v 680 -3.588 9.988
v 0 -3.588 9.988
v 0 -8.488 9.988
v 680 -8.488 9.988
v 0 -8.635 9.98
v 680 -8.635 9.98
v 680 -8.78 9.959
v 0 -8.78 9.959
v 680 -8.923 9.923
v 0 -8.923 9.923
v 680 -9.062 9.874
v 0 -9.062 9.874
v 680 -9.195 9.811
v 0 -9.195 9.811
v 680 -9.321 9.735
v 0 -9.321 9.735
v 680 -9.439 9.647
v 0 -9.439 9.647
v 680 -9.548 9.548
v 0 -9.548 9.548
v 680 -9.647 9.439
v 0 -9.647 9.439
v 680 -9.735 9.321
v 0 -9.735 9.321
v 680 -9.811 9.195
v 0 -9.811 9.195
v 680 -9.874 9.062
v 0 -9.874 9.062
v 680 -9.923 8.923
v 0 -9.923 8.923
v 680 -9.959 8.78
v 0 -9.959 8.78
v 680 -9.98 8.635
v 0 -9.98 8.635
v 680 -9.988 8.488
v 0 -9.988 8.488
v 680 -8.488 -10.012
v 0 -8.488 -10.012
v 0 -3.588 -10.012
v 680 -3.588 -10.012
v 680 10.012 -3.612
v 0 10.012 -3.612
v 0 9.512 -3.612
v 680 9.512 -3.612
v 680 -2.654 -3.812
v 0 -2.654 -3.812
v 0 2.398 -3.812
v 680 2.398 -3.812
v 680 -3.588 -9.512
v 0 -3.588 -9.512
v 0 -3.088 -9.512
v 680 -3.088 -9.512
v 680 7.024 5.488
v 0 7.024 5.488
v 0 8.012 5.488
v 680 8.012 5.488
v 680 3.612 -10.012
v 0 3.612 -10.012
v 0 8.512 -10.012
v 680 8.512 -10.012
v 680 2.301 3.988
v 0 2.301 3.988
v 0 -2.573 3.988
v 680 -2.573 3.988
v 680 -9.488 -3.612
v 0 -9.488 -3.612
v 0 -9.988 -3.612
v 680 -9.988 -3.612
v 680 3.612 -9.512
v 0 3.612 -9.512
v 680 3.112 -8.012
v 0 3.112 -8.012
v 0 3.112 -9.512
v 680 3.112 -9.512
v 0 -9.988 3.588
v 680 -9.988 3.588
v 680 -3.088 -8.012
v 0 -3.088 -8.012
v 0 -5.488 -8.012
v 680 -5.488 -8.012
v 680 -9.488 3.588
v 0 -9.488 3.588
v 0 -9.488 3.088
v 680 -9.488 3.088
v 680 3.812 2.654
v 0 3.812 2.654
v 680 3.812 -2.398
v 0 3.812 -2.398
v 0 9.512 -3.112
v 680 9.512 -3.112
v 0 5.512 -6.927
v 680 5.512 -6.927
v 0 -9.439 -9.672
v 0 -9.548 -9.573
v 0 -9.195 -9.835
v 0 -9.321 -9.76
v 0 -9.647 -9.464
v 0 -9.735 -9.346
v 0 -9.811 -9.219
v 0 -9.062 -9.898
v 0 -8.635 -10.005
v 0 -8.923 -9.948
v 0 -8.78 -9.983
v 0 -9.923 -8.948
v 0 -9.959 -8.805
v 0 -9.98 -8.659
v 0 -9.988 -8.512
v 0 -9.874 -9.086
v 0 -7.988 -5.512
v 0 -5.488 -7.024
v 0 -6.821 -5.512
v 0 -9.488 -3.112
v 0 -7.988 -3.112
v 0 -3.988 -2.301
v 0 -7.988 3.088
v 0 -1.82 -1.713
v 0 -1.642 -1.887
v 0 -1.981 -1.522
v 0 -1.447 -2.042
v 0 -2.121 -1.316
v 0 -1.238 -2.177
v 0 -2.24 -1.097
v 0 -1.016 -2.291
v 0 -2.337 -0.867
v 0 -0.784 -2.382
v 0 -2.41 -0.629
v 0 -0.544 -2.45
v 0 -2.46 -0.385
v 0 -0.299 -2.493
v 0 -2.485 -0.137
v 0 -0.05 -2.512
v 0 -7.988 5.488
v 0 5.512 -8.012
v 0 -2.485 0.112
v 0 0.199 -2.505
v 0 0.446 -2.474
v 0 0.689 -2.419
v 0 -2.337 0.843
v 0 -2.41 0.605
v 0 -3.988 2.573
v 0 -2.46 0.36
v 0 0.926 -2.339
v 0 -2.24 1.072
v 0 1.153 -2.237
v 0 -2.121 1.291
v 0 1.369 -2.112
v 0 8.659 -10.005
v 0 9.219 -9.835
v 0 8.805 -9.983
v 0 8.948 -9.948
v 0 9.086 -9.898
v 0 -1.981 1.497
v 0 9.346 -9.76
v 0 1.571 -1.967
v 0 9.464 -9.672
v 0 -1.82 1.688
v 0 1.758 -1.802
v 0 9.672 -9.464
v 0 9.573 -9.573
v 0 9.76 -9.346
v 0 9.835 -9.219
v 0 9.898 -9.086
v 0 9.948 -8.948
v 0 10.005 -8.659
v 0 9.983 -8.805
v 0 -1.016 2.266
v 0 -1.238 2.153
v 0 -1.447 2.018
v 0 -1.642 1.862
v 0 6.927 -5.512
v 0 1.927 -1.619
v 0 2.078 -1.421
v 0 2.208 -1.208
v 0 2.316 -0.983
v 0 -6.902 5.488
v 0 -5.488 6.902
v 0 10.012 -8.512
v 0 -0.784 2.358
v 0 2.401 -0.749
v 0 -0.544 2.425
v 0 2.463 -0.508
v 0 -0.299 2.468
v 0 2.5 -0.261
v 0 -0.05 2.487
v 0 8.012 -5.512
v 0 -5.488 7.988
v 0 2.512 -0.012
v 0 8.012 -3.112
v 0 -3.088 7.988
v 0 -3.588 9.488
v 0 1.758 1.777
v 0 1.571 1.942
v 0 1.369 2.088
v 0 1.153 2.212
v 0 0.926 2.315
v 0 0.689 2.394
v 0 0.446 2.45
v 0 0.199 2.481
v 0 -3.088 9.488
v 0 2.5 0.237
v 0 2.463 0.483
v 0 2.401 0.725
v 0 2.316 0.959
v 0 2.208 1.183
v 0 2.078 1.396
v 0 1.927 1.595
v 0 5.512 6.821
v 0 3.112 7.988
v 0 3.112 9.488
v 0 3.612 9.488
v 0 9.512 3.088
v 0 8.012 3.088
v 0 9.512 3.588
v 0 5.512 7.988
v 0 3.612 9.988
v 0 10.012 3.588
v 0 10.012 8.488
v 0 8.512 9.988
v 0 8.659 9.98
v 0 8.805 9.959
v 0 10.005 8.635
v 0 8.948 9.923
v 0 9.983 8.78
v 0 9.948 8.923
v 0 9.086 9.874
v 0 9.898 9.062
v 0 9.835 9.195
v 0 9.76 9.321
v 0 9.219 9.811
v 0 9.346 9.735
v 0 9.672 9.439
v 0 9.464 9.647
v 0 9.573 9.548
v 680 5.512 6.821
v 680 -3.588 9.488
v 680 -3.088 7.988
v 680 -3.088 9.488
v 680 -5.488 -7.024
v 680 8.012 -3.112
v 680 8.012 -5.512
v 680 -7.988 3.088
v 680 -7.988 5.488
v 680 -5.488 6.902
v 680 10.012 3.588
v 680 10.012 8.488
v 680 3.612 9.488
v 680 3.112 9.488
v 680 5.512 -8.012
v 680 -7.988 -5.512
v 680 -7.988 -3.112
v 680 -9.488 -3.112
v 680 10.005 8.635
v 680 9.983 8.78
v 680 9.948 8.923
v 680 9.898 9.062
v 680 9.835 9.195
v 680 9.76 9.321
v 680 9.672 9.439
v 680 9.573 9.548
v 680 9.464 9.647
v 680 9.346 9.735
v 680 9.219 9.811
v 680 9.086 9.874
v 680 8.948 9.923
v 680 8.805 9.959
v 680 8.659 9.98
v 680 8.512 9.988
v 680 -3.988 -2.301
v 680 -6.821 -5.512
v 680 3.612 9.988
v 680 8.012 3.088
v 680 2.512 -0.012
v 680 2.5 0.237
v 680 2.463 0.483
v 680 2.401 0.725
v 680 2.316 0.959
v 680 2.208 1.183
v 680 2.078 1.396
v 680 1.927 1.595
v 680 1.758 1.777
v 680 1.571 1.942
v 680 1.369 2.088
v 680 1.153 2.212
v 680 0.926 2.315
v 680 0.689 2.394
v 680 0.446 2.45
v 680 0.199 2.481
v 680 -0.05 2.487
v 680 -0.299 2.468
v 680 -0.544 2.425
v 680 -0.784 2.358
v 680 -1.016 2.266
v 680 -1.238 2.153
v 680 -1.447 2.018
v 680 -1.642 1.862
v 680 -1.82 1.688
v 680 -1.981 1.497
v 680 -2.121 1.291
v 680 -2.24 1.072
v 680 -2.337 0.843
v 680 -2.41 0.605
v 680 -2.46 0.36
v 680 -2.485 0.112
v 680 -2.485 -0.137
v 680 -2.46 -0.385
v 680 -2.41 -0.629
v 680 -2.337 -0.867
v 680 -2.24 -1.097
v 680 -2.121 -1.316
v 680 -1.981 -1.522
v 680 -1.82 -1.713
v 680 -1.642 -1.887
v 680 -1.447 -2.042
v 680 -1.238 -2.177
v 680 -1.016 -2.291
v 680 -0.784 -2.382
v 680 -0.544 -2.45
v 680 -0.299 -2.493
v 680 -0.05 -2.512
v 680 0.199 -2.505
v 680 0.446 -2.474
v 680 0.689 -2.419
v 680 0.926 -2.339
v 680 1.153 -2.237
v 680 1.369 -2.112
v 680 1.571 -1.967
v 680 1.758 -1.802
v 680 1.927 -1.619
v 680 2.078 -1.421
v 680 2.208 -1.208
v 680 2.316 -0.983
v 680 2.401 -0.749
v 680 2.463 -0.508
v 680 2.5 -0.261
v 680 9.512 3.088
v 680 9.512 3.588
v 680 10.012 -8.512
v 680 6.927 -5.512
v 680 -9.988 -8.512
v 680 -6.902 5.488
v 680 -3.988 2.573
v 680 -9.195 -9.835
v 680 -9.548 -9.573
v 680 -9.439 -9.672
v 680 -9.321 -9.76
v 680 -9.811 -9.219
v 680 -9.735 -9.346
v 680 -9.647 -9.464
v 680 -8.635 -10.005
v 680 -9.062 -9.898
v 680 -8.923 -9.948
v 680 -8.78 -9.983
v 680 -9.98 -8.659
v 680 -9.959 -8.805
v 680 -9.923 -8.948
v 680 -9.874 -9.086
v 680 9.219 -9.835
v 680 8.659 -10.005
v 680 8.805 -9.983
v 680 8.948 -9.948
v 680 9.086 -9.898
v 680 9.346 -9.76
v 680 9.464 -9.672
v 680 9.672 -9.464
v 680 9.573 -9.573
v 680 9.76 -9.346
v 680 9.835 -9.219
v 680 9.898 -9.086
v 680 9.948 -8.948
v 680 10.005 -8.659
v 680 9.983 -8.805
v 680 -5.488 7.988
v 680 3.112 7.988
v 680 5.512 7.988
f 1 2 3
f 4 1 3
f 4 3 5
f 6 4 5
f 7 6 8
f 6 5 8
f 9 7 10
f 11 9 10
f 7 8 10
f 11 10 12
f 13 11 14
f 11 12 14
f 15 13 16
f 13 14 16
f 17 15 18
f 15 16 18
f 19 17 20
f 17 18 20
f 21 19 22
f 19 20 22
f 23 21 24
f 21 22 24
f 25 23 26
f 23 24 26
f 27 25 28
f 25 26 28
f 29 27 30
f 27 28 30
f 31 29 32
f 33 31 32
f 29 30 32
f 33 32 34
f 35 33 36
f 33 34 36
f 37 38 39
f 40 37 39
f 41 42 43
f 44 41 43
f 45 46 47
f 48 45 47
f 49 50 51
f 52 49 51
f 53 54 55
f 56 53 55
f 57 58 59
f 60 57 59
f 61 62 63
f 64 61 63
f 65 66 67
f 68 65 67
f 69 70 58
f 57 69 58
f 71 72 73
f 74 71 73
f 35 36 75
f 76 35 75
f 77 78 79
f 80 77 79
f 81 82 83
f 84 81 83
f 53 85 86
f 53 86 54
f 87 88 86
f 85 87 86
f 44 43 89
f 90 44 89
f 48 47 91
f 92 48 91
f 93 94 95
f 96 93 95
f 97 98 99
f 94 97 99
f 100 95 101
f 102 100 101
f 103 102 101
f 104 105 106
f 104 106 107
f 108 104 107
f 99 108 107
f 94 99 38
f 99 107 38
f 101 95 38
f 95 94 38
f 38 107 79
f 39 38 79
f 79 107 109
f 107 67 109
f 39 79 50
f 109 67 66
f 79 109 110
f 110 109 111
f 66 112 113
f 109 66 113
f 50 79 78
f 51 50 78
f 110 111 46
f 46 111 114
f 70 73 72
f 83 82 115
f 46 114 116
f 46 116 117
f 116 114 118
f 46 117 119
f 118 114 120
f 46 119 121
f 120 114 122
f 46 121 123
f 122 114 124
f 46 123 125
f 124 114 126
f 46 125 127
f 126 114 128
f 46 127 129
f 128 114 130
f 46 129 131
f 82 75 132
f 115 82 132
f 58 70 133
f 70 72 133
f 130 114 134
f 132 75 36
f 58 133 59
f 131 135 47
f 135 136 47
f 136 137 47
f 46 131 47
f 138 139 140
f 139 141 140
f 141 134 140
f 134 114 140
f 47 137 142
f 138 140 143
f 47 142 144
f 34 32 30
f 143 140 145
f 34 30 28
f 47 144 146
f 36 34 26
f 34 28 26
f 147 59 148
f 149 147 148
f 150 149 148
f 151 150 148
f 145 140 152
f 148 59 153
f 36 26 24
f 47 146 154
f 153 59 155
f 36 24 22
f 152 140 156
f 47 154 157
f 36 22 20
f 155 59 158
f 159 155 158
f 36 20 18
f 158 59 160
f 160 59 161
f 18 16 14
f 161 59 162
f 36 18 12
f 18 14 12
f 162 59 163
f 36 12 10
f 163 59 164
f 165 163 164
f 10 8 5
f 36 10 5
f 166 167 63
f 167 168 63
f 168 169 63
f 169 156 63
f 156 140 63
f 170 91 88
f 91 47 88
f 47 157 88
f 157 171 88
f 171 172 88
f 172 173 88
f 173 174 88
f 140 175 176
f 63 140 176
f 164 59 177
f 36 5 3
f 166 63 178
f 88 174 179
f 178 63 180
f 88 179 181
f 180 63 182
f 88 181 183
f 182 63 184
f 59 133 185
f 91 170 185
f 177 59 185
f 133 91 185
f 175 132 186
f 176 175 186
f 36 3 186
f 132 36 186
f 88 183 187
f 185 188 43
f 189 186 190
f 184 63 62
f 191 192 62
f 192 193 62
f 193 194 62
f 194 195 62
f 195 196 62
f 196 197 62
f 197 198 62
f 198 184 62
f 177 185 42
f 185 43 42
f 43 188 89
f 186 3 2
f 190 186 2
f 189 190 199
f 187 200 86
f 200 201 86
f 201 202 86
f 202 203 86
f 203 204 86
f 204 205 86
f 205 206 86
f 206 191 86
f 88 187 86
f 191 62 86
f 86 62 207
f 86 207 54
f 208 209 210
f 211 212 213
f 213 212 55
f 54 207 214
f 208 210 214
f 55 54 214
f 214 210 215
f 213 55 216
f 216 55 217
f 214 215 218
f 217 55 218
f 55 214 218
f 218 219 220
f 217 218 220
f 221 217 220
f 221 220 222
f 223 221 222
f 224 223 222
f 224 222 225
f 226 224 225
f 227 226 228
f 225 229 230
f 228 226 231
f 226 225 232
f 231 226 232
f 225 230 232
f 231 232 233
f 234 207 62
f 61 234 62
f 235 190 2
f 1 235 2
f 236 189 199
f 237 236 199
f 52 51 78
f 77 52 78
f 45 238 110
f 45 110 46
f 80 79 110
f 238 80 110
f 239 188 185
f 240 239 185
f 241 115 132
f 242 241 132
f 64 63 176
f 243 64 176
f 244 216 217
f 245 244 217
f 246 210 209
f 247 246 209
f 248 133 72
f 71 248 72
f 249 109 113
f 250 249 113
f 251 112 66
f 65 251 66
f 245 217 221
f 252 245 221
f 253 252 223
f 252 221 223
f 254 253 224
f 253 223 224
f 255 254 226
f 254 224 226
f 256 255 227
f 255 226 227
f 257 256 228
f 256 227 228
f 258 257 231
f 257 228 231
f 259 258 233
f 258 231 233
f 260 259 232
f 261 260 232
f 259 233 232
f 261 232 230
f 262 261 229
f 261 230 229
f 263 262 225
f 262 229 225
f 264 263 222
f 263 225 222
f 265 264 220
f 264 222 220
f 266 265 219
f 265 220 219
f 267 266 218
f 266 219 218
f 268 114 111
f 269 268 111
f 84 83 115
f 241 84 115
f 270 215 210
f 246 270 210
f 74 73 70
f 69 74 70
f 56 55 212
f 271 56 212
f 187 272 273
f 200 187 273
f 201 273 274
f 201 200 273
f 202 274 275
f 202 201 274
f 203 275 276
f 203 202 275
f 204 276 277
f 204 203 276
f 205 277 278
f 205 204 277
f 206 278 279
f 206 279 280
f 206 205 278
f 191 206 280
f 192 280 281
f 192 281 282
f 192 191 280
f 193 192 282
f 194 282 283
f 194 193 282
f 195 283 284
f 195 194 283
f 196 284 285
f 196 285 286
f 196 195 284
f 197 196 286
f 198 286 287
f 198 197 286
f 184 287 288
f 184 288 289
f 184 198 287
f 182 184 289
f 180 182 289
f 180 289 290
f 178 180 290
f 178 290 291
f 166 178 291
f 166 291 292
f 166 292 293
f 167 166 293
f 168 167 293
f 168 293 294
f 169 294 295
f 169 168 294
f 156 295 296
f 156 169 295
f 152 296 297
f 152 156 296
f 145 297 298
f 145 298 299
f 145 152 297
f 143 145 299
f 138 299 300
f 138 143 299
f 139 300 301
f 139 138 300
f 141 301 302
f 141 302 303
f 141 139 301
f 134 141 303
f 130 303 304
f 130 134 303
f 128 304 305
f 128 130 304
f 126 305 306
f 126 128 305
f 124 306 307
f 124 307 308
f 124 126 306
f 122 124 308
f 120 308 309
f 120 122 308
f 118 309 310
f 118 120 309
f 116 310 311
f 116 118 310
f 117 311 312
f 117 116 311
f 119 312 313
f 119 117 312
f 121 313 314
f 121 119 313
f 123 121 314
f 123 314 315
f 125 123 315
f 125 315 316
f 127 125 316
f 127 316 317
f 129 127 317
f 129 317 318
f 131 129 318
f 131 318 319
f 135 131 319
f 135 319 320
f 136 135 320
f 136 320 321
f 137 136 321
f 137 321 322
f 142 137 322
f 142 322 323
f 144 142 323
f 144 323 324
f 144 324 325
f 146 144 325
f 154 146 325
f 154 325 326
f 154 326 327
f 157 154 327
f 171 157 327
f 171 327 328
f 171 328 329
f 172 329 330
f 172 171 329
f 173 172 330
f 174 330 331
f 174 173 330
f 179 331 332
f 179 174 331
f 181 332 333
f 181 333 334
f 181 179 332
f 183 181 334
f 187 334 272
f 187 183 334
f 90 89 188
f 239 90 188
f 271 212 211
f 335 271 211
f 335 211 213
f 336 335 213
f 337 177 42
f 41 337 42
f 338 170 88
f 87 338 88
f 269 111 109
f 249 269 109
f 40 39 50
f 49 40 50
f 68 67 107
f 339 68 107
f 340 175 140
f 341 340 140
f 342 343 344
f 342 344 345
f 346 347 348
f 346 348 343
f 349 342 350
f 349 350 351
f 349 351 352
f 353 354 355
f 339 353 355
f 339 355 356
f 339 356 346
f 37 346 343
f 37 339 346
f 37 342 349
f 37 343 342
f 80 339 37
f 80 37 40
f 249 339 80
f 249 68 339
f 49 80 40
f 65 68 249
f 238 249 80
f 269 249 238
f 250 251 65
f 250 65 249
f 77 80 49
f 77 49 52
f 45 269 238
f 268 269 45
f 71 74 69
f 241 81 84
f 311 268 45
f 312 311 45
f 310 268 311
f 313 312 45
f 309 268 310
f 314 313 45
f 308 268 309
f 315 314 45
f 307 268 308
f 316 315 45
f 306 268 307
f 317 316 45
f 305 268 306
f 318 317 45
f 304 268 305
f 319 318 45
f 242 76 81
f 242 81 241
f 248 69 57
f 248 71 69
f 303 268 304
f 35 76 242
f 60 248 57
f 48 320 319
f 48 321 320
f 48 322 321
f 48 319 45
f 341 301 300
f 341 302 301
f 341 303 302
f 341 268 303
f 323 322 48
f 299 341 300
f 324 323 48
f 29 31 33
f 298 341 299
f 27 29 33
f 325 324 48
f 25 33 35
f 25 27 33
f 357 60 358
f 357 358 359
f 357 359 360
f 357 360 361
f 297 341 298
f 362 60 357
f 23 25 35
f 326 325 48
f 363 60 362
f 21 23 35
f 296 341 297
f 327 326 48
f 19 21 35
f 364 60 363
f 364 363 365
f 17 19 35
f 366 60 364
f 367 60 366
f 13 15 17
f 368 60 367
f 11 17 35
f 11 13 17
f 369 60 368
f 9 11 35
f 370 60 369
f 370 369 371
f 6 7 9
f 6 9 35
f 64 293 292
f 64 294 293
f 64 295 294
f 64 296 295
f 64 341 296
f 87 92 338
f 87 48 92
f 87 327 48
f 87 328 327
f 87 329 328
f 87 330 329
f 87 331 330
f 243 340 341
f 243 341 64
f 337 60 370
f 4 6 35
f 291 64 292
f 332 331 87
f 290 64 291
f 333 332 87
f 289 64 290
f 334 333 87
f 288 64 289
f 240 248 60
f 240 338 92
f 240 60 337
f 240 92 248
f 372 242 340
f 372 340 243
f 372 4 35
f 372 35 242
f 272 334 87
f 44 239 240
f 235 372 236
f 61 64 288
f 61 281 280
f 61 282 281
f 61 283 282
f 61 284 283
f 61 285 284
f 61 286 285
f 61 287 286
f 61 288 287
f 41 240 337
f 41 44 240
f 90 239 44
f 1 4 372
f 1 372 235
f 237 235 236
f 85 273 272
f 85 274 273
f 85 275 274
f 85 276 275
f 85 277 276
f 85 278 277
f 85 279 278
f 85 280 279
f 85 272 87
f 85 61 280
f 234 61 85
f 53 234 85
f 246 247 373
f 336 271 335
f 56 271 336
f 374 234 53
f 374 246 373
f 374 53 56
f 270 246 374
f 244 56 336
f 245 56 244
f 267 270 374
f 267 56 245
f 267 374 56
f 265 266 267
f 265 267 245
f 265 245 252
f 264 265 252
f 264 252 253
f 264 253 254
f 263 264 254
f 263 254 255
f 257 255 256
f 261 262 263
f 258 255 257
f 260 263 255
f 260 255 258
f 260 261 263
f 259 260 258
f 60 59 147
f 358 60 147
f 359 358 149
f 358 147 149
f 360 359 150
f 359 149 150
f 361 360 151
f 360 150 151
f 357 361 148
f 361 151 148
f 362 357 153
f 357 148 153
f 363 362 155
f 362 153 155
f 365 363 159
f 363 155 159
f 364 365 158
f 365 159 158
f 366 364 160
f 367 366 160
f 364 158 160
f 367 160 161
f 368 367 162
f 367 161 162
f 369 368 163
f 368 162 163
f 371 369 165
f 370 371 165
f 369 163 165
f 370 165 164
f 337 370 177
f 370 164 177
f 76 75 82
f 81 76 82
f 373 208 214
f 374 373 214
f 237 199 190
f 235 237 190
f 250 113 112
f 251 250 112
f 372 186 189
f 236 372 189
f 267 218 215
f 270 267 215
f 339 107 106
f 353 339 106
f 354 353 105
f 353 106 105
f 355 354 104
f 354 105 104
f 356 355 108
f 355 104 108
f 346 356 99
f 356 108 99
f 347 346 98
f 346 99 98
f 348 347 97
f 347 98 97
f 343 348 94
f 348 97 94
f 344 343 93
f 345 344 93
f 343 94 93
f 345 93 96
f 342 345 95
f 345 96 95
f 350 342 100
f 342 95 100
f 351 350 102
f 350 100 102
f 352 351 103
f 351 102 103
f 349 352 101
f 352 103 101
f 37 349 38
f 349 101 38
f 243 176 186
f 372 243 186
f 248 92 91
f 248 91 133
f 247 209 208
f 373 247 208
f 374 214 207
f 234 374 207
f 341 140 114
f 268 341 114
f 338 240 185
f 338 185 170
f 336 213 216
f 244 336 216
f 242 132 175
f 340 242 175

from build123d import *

# Parameters (mm, degrees)
F0_R     = 2.5
F1_DEPTH = 680


with BuildPart() as f1:
    # F0 (on Right) → F1 (new body)
    with BuildSketch(Plane.YZ):
        with BuildLine():
            Line((-3.587692, 9.987692), (-8.487692, 9.987692))
            ThreePointArc((-8.487692, 9.987692), (-9.548352, 9.548352), (-9.987692, 8.487692))
            Line((-9.987692, 8.487692), (-9.987692, 3.587692))
            Line((-9.987692, 3.587692), (-9.487692, 3.587692))
            Line((-9.487692, 3.587692), (-9.487692, 3.087692))
            Line((-9.487692, 3.087692), (-7.987692, 3.087692))
            Line((-7.987692, 3.087692), (-7.987692, 5.487692))
            Line((-7.987692, 5.487692), (-6.901906, 5.487692))
            Line((-6.901906, 5.487692), (-3.987692, 2.573479))
            Line((-3.987692, 2.573479), (-3.987692, -2.30087))
            Line((-3.987692, -2.30087), (-6.821314, -5.512308))
            Line((-6.821314, -5.512308), (-7.987692, -5.512308))
            Line((-7.987692, -5.512308), (-7.987692, -3.112308))
            Line((-7.987692, -3.112308), (-9.487692, -3.112308))
            Line((-9.487692, -3.112308), (-9.487692, -3.612308))
            Line((-9.487692, -3.612308), (-9.987692, -3.612308))
            Line((-9.987692, -3.612308), (-9.987692, -8.512308))
            ThreePointArc((-9.987692, -8.512308), (-9.548352, -9.572968), (-8.487692, -10.012308))
            Line((-8.487692, -10.012308), (-3.587692, -10.012308))
            Line((-3.587692, -10.012308), (-3.587692, -9.512308))
            Line((-3.587692, -9.512308), (-3.087692, -9.512308))
            Line((-3.087692, -9.512308), (-3.087692, -8.012308))
            Line((-3.087692, -8.012308), (-5.487692, -8.012308))
            Line((-5.487692, -8.012308), (-5.487692, -7.023746))
            Line((-5.487692, -7.023746), (-2.654071, -3.812308))
            Line((-2.654071, -3.812308), (2.398094, -3.812308))
            Line((2.398094, -3.812308), (5.512308, -6.926521))
            Line((5.512308, -6.926521), (5.512308, -8.012308))
            Line((5.512308, -8.012308), (3.112308, -8.012308))
            Line((3.112308, -8.012308), (3.112308, -9.512308))
            Line((3.112308, -9.512308), (3.612308, -9.512308))
            Line((3.612308, -9.512308), (3.612308, -10.012308))
            Line((3.612308, -10.012308), (8.512308, -10.012308))
            ThreePointArc((8.512308, -10.012308), (9.572968, -9.572968), (10.012308, -8.512308))
            Line((10.012308, -8.512308), (10.012308, -3.612308))
            Line((10.012308, -3.612308), (9.512308, -3.612308))
            Line((9.512308, -3.612308), (9.512308, -3.112308))
            Line((9.512308, -3.112308), (8.012308, -3.112308))
            Line((8.012308, -3.112308), (8.012308, -5.512308))
            Line((8.012308, -5.512308), (6.926521, -5.512308))
            Line((6.926521, -5.512308), (3.812308, -2.398094))
            Line((3.812308, -2.398094), (3.812308, 2.654071))
            Line((3.812308, 2.654071), (7.023746, 5.487692))
            Line((7.023746, 5.487692), (8.012308, 5.487692))
            Line((8.012308, 5.487692), (8.012308, 3.087692))
            Line((8.012308, 3.087692), (9.512308, 3.087692))
            Line((9.512308, 3.087692), (9.512308, 3.587692))
            Line((9.512308, 3.587692), (10.012308, 3.587692))
            Line((10.012308, 3.587692), (10.012308, 8.487692))
            ThreePointArc((10.012308, 8.487692), (9.572968, 9.548352), (8.512308, 9.987692))
            Line((8.512308, 9.987692), (3.612308, 9.987692))
            Line((3.612308, 9.987692), (3.612308, 9.487692))
            Line((3.612308, 9.487692), (3.112308, 9.487692))
            Line((3.112308, 9.487692), (3.112308, 7.987692))
            Line((3.112308, 7.987692), (5.512308, 7.987692))
            Line((5.512308, 7.987692), (5.512308, 6.821314))
            Line((5.512308, 6.821314), (2.30087, 3.987692))
            Line((2.30087, 3.987692), (-2.573479, 3.987692))
            Line((-2.573479, 3.987692), (-5.487692, 6.901906))
            Line((-5.487692, 6.901906), (-5.487692, 7.987692))
            Line((-5.487692, 7.987692), (-3.087692, 7.987692))
            Line((-3.087692, 7.987692), (-3.087692, 9.487692))
            Line((-3.087692, 9.487692), (-3.587692, 9.487692))
            Line((-3.587692, 9.487692), (-3.587692, 9.987692))
        make_face()
        with Locations((0.012308, -0.012308)):
            Circle(F0_R, mode=Mode.SUBTRACT)
    extrude(amount=F1_DEPTH)


solid = f1.part
